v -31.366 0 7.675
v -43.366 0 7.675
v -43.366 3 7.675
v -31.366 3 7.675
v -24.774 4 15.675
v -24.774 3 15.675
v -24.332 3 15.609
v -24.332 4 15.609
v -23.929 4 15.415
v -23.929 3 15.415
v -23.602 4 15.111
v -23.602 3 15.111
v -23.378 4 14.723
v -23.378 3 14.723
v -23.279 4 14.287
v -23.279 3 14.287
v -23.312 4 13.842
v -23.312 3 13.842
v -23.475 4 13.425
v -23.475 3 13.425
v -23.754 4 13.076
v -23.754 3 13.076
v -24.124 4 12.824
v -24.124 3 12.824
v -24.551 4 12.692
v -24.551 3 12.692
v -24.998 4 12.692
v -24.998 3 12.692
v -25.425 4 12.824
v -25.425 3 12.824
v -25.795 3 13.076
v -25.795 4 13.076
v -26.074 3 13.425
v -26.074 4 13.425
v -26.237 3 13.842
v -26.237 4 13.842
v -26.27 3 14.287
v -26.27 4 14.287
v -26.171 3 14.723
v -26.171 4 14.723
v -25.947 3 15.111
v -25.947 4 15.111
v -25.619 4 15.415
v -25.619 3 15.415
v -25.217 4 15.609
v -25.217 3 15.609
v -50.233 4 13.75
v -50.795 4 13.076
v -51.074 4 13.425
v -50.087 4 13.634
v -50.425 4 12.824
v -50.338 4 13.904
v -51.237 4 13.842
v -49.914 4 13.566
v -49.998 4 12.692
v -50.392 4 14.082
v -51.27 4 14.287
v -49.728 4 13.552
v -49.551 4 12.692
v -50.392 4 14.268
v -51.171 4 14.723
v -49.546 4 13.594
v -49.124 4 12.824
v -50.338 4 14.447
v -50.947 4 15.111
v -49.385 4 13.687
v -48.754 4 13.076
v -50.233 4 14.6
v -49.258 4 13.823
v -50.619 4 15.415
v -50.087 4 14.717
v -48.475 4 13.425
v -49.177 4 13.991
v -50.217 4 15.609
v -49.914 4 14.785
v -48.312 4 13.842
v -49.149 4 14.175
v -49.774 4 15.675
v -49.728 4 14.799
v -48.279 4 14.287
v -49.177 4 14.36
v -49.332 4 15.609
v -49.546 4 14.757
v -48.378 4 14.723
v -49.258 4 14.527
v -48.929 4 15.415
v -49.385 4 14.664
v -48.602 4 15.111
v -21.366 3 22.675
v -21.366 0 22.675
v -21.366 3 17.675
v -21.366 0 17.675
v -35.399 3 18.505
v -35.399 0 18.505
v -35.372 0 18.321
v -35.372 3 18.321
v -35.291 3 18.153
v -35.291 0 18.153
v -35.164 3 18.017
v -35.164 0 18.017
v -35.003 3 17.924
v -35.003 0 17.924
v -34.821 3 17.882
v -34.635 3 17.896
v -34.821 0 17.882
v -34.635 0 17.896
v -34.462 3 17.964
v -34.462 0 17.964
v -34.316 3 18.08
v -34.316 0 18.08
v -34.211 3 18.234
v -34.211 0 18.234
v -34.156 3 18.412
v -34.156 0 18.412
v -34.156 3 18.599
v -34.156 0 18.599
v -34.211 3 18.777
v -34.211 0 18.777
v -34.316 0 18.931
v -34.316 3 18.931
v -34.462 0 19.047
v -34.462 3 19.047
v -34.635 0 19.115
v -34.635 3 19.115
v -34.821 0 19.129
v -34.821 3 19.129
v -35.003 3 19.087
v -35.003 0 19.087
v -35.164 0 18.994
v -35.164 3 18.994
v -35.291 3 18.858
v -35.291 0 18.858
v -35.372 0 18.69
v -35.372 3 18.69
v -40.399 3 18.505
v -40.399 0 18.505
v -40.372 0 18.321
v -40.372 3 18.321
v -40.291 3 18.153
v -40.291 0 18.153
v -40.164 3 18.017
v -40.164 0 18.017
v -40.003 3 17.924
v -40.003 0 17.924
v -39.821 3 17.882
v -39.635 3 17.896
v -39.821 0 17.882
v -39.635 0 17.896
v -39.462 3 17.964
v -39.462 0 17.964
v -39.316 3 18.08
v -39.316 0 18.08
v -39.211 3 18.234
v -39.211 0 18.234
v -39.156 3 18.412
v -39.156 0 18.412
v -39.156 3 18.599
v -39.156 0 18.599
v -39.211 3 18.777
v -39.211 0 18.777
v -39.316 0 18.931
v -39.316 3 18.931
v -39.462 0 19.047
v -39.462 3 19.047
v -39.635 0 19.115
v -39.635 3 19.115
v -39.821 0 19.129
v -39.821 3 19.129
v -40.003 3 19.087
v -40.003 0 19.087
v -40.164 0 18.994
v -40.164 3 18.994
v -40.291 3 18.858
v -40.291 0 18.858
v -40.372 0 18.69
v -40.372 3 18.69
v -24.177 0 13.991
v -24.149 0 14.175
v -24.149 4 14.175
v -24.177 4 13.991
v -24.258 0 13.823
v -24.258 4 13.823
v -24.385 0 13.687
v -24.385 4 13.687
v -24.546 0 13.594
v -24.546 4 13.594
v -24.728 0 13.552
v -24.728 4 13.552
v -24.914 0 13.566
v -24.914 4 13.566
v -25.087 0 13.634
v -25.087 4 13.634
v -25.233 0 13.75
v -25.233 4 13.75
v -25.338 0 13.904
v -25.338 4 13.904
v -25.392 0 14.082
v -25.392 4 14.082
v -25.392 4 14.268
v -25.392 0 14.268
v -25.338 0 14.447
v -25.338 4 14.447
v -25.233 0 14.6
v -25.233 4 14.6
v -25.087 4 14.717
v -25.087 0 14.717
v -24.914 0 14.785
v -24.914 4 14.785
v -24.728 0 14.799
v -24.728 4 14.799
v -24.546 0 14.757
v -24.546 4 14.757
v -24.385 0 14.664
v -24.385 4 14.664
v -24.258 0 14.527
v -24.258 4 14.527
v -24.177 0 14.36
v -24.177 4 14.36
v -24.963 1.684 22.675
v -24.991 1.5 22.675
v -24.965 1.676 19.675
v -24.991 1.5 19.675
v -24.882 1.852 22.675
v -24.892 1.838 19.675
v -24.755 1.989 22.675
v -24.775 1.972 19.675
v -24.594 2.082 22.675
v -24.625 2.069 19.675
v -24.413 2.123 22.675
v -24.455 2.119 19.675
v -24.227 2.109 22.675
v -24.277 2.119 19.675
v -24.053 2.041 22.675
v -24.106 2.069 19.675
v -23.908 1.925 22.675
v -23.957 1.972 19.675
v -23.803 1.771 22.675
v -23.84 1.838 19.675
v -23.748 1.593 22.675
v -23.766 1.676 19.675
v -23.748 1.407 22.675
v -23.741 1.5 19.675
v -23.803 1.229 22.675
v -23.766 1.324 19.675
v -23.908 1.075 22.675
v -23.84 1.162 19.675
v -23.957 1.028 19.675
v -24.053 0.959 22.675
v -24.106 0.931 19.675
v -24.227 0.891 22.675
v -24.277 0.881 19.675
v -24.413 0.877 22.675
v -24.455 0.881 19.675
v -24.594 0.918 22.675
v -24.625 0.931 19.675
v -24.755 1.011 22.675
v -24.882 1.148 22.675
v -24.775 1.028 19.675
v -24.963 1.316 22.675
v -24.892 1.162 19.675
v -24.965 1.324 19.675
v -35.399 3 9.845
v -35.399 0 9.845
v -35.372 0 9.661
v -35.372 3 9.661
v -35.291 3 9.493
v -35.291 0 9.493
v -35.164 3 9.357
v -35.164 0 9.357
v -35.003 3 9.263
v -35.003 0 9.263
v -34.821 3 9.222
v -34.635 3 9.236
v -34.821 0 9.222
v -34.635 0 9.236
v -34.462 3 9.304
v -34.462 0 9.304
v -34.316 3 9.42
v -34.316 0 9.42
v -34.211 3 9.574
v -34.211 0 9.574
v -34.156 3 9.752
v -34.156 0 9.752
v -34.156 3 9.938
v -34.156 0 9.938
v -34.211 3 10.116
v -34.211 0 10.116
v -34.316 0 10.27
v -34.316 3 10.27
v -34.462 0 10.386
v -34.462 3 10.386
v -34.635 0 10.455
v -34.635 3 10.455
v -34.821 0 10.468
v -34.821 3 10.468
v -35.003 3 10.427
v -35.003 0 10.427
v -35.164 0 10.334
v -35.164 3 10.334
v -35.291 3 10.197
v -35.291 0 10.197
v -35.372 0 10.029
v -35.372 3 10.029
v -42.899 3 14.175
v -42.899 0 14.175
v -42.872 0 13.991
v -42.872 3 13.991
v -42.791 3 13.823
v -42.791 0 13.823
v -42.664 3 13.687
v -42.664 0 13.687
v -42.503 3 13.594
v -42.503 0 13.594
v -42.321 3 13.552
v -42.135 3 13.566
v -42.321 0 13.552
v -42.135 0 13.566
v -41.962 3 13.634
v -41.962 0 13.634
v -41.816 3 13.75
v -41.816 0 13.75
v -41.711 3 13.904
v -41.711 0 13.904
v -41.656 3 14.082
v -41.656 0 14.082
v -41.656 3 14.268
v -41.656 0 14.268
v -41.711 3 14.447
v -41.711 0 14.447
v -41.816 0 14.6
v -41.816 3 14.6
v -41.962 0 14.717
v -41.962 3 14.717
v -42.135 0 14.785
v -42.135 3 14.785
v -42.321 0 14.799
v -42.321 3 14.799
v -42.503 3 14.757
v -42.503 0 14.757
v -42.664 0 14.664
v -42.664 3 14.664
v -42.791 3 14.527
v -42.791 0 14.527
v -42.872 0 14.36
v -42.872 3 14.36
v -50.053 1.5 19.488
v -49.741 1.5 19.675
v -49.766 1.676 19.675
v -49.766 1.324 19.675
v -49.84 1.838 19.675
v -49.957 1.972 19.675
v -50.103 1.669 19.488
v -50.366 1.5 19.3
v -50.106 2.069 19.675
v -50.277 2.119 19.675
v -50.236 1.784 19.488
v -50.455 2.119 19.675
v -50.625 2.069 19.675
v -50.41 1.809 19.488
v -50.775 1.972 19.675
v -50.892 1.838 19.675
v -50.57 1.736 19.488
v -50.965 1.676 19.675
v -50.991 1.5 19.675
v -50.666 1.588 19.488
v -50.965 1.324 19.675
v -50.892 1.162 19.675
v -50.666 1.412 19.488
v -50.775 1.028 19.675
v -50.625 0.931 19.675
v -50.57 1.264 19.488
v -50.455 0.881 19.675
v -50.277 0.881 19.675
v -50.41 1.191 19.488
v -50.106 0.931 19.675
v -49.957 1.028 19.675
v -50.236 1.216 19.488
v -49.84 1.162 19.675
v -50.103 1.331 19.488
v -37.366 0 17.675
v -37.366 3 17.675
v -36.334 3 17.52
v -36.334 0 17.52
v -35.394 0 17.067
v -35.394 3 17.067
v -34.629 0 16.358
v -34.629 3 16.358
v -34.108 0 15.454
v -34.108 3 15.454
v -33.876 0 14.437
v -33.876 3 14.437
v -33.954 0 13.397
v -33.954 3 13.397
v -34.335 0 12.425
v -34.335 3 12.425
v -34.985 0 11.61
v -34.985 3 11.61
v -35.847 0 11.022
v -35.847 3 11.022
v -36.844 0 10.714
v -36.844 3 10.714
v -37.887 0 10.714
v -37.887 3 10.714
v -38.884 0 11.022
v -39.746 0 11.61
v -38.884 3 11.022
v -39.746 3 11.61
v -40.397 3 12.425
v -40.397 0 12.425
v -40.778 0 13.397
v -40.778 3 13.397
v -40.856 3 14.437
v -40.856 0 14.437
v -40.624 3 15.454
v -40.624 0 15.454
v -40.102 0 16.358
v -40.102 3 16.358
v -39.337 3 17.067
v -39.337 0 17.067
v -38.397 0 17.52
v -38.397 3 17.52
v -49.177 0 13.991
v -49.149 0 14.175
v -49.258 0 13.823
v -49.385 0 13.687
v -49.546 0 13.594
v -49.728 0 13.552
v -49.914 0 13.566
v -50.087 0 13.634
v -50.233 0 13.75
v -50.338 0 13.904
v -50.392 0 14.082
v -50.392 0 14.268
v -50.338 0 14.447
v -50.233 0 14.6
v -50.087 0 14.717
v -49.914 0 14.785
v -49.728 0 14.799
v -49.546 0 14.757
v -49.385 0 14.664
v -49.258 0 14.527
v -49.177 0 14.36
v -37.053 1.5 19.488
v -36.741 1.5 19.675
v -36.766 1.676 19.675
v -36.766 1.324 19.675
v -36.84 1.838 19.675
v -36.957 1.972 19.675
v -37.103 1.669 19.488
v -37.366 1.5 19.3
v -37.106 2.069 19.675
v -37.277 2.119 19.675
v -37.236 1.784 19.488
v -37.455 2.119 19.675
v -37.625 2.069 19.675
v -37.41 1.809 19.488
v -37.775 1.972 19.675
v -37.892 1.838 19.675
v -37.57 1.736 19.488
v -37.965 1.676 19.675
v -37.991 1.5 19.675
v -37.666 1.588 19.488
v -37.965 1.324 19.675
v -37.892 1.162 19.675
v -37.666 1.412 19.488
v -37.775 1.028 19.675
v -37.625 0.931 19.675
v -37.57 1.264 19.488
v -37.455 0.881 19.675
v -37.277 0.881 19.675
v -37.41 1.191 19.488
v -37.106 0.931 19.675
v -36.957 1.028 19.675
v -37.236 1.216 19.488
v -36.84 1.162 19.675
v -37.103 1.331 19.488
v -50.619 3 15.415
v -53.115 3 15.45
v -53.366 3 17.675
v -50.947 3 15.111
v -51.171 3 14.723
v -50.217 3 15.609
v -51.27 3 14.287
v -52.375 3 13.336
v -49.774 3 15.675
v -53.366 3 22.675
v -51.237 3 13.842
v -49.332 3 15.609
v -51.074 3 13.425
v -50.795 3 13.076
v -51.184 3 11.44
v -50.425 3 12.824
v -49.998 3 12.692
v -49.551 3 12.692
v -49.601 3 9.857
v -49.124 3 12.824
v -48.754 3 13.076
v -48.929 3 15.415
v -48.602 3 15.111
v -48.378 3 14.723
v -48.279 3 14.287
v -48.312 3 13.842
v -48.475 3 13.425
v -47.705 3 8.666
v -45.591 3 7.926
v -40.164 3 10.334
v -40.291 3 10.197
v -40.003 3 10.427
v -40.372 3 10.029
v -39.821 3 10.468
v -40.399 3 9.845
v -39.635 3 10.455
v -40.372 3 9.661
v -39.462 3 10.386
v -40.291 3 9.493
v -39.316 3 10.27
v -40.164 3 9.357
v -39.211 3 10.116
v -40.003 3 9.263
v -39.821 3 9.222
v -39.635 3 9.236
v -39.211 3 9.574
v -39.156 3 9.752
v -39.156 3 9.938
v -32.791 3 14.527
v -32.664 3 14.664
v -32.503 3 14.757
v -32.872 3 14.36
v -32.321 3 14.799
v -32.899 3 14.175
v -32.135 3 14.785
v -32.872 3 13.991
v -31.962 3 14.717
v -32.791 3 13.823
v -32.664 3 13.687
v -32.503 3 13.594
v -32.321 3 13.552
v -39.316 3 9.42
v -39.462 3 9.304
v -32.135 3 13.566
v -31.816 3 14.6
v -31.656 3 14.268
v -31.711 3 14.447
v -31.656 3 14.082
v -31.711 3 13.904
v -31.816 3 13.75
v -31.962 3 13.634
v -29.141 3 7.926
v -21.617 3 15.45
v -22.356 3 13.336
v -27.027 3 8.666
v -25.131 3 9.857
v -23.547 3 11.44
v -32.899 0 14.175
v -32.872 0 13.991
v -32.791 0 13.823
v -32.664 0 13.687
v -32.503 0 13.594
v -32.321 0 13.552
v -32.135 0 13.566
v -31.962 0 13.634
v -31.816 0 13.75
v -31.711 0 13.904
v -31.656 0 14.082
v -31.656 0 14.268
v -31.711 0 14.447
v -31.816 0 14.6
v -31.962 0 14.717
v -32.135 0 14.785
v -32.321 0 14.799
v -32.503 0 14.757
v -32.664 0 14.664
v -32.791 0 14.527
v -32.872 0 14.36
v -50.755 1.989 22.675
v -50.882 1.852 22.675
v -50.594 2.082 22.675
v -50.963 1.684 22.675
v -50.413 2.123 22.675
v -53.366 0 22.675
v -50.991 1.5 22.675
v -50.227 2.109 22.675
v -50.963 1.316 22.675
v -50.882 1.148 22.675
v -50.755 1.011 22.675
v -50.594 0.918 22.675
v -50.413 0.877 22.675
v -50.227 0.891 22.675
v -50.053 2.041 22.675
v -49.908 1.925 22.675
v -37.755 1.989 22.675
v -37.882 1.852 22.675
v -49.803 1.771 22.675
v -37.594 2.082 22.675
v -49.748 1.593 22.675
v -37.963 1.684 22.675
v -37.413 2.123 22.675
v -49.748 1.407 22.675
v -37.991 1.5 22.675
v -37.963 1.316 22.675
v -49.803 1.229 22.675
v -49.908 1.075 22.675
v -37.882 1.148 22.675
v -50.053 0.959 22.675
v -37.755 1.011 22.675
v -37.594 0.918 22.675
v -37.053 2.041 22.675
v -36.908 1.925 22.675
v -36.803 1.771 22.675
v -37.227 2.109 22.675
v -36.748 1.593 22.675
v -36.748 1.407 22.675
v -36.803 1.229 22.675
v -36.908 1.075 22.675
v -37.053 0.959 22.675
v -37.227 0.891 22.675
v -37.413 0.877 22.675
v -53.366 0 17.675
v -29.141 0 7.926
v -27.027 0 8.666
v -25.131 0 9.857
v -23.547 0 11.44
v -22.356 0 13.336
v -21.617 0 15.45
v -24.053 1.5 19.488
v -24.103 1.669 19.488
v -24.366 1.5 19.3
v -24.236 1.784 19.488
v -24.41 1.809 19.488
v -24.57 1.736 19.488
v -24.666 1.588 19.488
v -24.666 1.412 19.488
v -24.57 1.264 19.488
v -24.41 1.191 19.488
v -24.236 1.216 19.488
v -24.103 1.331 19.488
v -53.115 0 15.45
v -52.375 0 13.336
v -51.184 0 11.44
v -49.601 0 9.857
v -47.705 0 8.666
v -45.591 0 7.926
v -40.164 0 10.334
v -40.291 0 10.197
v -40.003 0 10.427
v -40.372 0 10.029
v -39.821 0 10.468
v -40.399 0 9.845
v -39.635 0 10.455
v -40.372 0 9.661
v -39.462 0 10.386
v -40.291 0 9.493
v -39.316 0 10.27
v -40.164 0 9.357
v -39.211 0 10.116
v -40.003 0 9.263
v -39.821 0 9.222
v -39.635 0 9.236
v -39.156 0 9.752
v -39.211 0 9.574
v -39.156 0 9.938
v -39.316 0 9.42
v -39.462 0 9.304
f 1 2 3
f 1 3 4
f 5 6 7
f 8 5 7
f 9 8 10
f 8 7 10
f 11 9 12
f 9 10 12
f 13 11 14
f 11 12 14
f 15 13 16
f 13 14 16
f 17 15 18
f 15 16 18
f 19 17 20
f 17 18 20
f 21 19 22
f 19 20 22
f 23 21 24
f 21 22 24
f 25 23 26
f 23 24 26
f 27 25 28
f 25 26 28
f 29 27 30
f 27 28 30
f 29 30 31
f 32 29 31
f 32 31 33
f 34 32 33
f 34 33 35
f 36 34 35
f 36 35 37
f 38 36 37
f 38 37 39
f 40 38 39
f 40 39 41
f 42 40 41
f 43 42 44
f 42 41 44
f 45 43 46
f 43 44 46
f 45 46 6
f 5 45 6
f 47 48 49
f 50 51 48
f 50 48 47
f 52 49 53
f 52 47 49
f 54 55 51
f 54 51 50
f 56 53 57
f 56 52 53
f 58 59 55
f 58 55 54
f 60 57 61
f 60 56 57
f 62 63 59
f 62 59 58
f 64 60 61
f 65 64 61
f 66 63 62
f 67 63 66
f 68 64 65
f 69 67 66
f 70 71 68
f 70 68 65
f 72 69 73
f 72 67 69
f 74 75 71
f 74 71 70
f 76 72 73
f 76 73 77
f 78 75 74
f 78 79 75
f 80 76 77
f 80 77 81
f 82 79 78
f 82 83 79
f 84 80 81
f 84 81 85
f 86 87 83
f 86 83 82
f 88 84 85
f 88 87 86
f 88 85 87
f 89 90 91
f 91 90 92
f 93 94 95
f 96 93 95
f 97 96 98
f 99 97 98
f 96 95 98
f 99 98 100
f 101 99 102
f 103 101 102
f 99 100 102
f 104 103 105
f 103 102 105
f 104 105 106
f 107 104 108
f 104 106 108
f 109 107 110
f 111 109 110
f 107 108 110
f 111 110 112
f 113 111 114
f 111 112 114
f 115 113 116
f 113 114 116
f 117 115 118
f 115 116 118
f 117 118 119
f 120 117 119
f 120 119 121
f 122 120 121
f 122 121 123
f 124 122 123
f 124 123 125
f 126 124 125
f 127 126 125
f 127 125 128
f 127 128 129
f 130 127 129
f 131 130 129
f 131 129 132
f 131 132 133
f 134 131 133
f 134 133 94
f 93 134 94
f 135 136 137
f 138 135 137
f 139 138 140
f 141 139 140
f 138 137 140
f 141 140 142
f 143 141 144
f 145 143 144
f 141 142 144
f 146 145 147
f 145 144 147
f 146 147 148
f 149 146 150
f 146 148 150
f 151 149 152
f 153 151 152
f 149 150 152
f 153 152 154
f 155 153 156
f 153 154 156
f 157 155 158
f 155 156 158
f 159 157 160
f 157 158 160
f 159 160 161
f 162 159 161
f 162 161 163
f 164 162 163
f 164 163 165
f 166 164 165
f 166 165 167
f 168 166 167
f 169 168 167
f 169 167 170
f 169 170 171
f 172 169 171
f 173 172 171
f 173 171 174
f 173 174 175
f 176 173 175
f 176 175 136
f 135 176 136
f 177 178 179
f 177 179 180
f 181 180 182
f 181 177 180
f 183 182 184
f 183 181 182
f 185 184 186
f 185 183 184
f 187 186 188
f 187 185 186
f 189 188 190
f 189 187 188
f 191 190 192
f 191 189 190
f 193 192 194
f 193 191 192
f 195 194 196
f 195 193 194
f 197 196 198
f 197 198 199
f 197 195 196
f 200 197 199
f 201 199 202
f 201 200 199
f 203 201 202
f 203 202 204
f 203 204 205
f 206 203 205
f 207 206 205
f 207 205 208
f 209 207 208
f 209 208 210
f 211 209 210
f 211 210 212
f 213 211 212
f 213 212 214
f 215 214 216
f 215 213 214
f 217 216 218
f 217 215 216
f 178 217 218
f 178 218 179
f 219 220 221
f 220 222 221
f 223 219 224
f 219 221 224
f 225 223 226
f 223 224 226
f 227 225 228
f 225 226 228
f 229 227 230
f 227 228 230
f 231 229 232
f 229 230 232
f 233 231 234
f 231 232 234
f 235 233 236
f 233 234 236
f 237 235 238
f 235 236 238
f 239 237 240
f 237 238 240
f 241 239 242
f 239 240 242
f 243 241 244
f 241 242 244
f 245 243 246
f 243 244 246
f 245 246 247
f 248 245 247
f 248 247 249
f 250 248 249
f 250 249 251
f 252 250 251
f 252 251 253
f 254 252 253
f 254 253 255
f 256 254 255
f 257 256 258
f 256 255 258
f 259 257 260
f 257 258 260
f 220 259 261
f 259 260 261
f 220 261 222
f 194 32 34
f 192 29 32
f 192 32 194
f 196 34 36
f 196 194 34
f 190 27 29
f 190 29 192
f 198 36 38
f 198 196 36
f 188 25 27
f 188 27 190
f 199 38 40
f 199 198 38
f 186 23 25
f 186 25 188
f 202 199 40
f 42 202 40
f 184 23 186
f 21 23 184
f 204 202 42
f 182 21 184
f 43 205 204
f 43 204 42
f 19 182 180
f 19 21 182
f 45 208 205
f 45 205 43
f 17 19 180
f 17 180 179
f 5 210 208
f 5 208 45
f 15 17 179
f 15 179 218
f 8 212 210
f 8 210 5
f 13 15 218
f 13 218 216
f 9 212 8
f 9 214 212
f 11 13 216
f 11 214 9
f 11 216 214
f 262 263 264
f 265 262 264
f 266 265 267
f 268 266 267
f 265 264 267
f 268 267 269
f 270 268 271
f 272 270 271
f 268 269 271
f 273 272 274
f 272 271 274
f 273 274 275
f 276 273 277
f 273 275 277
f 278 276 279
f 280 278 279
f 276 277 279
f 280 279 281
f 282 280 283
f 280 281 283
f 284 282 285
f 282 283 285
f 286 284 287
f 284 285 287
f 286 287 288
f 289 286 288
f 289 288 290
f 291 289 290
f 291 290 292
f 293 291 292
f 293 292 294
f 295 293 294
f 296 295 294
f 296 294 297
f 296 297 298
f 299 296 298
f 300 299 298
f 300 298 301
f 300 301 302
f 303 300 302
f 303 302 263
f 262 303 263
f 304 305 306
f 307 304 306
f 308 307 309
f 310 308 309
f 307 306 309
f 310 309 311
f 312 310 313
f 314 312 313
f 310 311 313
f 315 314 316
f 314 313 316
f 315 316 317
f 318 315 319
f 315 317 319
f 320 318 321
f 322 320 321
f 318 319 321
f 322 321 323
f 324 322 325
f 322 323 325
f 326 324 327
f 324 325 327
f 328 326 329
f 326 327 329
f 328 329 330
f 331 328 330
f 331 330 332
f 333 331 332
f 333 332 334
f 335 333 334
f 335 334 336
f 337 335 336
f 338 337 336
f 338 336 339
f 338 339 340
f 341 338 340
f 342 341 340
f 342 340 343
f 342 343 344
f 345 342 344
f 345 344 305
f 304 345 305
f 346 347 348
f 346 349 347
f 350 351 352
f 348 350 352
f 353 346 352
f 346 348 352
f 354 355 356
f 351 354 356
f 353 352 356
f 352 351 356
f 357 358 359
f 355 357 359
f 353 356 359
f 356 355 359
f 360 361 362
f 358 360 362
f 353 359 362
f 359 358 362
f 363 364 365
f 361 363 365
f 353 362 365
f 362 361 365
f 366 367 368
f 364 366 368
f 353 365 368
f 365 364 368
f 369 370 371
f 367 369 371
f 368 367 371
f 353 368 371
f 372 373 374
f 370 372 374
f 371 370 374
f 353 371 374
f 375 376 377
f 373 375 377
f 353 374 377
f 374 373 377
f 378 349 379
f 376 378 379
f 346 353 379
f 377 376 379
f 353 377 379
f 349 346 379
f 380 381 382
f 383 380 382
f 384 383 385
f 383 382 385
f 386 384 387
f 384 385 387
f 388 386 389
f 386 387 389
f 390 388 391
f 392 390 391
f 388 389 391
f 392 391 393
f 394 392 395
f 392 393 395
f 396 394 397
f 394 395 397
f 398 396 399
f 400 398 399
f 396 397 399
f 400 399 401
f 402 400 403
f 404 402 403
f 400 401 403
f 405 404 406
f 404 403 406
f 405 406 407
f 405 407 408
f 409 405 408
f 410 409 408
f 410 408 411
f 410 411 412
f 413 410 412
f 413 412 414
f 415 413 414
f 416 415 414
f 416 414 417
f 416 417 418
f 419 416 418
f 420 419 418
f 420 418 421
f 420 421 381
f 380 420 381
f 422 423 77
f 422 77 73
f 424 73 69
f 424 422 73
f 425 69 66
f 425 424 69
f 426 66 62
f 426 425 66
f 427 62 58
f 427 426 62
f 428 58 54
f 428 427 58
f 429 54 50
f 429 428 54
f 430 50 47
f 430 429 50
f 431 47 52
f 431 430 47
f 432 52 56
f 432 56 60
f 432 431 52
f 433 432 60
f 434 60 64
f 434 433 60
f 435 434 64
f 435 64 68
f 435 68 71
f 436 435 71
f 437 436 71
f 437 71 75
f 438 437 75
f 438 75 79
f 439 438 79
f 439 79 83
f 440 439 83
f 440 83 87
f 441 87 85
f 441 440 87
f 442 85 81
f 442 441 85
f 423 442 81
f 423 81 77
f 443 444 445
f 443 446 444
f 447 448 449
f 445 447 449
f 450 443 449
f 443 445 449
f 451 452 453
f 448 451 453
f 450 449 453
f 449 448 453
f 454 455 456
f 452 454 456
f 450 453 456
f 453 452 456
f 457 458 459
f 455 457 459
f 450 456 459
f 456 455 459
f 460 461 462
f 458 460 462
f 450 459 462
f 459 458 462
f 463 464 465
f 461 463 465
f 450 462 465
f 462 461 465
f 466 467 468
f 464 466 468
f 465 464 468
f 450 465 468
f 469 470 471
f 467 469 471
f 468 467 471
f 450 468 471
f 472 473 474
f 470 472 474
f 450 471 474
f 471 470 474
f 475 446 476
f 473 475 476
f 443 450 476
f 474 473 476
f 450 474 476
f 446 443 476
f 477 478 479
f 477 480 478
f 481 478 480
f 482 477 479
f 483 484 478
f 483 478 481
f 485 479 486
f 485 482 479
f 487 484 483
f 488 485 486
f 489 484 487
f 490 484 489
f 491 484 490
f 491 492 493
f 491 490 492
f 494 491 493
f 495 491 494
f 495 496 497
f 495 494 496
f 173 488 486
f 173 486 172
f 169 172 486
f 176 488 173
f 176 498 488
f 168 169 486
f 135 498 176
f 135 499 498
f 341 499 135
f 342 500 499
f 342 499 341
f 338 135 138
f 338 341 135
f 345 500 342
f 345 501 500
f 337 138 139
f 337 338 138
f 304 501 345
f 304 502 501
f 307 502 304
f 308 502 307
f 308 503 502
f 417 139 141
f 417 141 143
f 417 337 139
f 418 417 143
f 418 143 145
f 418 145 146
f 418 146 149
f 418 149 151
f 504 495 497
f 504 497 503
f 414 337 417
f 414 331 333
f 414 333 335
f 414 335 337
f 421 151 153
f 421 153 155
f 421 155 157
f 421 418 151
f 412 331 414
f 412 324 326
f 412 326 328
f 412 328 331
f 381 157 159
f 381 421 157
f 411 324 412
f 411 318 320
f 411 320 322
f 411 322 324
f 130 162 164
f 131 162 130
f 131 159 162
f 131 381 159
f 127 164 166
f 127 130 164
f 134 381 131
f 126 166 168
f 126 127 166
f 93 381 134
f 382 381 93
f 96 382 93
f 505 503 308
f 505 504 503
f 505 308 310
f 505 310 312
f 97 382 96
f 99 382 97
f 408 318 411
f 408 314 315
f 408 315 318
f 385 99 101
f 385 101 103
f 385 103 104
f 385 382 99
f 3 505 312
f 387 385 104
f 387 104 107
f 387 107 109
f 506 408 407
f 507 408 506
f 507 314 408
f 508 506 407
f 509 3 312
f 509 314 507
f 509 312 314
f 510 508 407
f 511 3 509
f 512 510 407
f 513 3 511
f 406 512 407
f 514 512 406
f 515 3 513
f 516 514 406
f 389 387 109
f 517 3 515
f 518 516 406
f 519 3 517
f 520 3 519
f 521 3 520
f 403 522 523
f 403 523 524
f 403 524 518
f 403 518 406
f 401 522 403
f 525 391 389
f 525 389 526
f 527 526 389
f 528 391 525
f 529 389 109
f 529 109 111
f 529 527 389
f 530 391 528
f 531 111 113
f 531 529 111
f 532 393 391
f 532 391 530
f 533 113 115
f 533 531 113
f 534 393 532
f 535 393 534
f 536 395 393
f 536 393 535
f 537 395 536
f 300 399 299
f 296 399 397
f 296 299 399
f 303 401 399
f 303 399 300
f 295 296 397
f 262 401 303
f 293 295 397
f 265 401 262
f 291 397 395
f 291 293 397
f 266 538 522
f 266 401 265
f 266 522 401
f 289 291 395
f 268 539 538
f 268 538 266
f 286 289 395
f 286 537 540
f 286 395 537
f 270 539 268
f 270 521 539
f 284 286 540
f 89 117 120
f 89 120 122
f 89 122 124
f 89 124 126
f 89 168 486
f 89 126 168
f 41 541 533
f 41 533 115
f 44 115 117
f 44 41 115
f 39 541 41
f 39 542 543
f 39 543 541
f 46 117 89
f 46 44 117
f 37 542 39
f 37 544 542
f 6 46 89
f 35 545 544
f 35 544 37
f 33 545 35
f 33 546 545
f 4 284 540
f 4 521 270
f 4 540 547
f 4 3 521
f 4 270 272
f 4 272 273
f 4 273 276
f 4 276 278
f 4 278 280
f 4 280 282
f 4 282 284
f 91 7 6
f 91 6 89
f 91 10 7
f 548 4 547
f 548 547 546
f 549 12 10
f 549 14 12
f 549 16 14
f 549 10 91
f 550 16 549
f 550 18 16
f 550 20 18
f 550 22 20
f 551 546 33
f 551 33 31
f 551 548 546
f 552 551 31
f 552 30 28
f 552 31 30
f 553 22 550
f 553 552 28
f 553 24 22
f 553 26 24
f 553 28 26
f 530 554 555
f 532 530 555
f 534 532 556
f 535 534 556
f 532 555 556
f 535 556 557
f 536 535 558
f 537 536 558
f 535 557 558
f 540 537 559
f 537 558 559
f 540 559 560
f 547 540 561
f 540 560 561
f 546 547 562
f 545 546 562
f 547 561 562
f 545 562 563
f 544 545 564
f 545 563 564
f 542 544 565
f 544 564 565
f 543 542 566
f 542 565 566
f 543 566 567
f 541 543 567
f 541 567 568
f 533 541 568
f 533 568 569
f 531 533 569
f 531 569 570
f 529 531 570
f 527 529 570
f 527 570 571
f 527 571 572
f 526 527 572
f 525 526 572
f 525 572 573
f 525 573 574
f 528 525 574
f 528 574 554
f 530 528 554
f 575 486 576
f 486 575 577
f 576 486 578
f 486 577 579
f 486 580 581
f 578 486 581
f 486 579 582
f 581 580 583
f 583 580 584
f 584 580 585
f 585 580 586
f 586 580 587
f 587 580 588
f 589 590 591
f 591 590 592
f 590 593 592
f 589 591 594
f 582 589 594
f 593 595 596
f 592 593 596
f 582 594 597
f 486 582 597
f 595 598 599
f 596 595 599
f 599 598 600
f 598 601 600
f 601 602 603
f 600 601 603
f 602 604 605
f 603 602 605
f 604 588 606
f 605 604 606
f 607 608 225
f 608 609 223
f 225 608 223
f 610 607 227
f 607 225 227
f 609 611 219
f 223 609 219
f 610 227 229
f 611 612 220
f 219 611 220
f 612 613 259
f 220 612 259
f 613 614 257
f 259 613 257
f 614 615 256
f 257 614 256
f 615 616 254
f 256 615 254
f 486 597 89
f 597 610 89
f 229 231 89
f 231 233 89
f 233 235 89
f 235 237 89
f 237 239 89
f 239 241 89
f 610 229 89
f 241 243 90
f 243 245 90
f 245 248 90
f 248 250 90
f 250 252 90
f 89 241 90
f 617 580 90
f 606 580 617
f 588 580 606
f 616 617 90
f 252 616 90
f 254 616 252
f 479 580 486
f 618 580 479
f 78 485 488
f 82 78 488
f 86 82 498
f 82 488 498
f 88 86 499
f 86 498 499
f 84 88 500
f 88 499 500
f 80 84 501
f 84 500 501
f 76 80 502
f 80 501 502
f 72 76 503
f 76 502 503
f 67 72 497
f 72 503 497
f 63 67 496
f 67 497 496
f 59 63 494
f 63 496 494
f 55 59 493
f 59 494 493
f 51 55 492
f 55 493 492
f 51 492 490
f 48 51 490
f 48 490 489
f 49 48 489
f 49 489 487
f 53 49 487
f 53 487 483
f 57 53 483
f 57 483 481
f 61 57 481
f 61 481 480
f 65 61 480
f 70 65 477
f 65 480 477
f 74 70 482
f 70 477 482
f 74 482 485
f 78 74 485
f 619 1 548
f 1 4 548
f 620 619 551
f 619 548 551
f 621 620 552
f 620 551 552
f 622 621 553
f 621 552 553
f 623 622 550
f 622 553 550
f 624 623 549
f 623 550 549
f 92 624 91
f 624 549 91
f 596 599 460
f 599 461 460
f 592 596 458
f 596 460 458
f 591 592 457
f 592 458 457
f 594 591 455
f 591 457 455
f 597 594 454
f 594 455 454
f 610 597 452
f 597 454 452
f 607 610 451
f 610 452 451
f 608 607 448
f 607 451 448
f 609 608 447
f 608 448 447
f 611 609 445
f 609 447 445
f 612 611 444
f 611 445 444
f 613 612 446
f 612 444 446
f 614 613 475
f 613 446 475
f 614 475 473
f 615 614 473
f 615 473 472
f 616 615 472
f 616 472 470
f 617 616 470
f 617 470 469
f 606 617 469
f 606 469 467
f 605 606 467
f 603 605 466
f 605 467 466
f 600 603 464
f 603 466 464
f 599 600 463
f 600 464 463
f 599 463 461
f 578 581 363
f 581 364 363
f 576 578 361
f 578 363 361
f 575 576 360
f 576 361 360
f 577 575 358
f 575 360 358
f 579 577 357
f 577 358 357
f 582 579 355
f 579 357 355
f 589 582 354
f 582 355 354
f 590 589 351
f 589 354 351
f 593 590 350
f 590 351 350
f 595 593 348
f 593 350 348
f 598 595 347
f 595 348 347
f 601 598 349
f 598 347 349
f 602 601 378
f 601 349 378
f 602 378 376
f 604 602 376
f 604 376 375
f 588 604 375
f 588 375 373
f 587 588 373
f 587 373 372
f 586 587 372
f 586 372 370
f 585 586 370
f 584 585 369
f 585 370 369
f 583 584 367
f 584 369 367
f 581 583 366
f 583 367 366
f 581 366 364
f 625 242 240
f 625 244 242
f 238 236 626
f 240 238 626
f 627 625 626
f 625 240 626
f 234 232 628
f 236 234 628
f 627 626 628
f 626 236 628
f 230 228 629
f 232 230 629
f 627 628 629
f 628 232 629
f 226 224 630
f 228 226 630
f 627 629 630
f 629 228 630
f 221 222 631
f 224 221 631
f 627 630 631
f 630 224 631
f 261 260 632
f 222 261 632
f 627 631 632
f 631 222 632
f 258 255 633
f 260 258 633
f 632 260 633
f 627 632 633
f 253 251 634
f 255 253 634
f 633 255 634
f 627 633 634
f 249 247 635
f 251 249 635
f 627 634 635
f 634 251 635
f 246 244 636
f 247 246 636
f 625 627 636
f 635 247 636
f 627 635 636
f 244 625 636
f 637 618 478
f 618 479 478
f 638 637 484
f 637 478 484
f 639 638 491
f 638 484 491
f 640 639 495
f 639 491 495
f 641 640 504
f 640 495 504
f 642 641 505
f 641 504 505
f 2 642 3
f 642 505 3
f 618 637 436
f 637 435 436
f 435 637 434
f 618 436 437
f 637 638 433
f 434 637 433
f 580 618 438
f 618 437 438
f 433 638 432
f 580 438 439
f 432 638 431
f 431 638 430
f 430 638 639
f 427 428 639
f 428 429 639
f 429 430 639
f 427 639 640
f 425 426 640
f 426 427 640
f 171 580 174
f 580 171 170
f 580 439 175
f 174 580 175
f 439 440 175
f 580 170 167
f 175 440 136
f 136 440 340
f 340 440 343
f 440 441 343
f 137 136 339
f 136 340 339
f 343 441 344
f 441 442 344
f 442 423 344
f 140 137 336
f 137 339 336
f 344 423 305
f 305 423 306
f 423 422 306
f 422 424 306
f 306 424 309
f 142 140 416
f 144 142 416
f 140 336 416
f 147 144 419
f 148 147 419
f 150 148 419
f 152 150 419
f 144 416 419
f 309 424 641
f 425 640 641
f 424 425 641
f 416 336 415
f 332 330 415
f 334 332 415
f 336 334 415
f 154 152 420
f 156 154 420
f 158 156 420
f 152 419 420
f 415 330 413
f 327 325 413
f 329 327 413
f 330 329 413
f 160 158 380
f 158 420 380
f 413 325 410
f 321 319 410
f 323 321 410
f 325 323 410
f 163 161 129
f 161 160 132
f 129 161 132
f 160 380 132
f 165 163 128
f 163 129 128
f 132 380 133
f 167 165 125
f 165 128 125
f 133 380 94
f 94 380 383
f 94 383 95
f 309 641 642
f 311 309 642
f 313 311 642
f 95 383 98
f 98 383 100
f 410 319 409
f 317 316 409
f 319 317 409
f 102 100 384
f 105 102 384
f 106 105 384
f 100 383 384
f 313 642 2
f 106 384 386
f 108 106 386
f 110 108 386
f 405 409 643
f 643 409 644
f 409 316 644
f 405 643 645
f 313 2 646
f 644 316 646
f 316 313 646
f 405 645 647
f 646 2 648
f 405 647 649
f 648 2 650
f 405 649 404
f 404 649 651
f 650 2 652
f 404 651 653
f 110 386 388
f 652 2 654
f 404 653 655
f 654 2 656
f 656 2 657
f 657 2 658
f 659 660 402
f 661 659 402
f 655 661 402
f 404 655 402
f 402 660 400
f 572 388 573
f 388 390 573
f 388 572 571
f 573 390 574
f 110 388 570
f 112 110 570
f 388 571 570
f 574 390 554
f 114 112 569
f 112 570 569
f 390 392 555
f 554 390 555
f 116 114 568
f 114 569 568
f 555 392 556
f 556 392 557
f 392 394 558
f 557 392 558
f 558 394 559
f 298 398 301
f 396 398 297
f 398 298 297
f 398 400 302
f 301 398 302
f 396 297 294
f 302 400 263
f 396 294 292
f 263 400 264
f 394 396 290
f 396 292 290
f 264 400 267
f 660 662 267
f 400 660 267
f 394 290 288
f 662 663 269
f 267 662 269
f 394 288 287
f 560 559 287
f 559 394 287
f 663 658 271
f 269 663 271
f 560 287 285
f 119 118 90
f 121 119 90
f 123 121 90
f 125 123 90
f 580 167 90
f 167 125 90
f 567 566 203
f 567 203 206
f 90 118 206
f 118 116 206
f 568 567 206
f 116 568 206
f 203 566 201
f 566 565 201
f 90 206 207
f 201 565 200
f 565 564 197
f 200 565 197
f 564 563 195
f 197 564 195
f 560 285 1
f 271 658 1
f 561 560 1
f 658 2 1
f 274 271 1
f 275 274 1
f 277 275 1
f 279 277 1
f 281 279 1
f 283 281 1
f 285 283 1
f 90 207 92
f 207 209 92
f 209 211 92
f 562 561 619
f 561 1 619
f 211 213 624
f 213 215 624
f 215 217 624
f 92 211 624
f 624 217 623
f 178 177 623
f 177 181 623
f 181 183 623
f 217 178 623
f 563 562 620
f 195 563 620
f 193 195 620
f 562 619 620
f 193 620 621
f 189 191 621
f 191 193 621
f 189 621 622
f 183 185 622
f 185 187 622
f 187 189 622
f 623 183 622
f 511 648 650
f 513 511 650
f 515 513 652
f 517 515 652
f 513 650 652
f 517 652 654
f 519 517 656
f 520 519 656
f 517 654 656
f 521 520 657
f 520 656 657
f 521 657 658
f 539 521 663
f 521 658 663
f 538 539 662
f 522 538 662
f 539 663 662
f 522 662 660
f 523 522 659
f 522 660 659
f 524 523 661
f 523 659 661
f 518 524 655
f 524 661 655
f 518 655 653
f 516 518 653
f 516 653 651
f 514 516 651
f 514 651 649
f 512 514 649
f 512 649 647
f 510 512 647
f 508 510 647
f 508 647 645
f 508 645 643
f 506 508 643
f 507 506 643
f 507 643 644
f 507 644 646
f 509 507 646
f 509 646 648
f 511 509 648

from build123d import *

# Parameters (mm, degrees)
SKETCH1_W                        = 32
SKETCH1_H                        = 15
BOSS_EXTRUDE1_DEPTH              = 3
SKETCH2_R                        = 3.5
CUT_EXTRUDE1_DEPTH               = 4
M1_6X0_35_TAPPED_HOLE2_D         = 1.25
SKETCH21_R                       = 1.5
BOSS_EXTRUDE4_DEPTH              = 1
M1_6X0_35_TAPPED_HOLE3_OUTLINE_R = 0.625
M1_6X0_35_TAPPED_HOLE3_DEPTH     = 4
FILLET1_R                        = 10
M1_6X0_35_TAPPED_HOLE4_D         = 1.25
M1_6X0_35_TAPPED_HOLE4_DEPTH     = 3
M1_6X0_35_TAPPED_HOLE4_TIP       = 0.375537887


# Read off the part's stored shape, not the designer's step: M1.6x0.35 Tapped Hole3
with BuildPart() as part:
    # Sketch1 → Boss-Extrude1 (new body)
    with BuildSketch(Plane(origin=(0, 0, 0), x_dir=(1, 0, 0), z_dir=(0, 1, 0))):
        with Locations((-37.365810967, -15.175330849)):
            Rectangle(SKETCH1_W, SKETCH1_H)
    extrude(amount=BOSS_EXTRUDE1_DEPTH)

    # Sketch2 → Cut-Extrude1 (cut)
    with BuildSketch(Plane(origin=(0, 3, 0), x_dir=(1, 0, 0), z_dir=(0, 1, 0))):
        with Locations(Location((-37.365810967, -14.175330849, 0), (0, 0, 270))):
            Circle(SKETCH2_R)
    extrude(amount=-CUT_EXTRUDE1_DEPTH, mode=Mode.SUBTRACT)

    # M1.6x0.35 Tapped Hole2 (through all)
    with Locations(Plane(origin=(0, 3, 0), x_dir=(1, 0, 0), z_dir=(0, 1, 0))):
        with Locations((-34.774464311, -18.505457868), (-39.774464311, -18.505457868), (-42.274464311, -14.175330849), (-39.774464311, -9.84520383), (-34.774464311, -9.84520383), (-32.274464311, -14.175330849)):
            Hole(M1_6X0_35_TAPPED_HOLE2_D / 2)

    # Sketch21 → Boss-Extrude4 (add)
    with BuildSketch(Plane(origin=(0, 3, 0), x_dir=(1, 0, 0), z_dir=(0, 1, 0))):
        with Locations(Location((-49.774464311, -14.175330849, 0), (0, 0, 270))):
            Circle(SKETCH21_R)
        with Locations(Location((-24.774464311, -14.175330849, 0), (0, 0, 270))):
            Circle(SKETCH21_R)
    extrude(amount=BOSS_EXTRUDE4_DEPTH)

    # M1.6x0.35 Tapped Hole3 outline → M1.6x0.35 Tapped Hole3 (cut)
    with BuildSketch(Plane(origin=(0, 0, 0), x_dir=(1, 0, 0), z_dir=(0, 1, 0))):
        with Locations((-24.774464311, -14.175330849)):
            Circle(M1_6X0_35_TAPPED_HOLE3_OUTLINE_R)
        with Locations((-49.774464311, -14.175330849)):
            Circle(M1_6X0_35_TAPPED_HOLE3_OUTLINE_R)
    extrude(amount=M1_6X0_35_TAPPED_HOLE3_DEPTH, mode=Mode.SUBTRACT)

    # Fillet1
    fillet1_edges = [part.edges().sort_by_distance(p)[0] for p in [
        (-53.365810967, 1.5, 7.675330849),
        (-21.365810967, 1.5, 7.675330849),
    ]]
    fillet(fillet1_edges, radius=FILLET1_R)

    # M1.6x0.35 Tapped Hole4
    with Locations(Plane.XY.offset(22.675330849)):
        with Locations((-50.365810967, 1.5), (-24.365810967, 1.5), (-37.365810967, 1.5)):
            Hole(M1_6X0_35_TAPPED_HOLE4_D / 2, depth=M1_6X0_35_TAPPED_HOLE4_DEPTH)
            with Locations((0, 0, -(M1_6X0_35_TAPPED_HOLE4_DEPTH + M1_6X0_35_TAPPED_HOLE4_TIP / 2))):  # 118° drill point
                Cone(0, M1_6X0_35_TAPPED_HOLE4_D / 2, M1_6X0_35_TAPPED_HOLE4_TIP, mode=Mode.SUBTRACT)


solid = part.part
